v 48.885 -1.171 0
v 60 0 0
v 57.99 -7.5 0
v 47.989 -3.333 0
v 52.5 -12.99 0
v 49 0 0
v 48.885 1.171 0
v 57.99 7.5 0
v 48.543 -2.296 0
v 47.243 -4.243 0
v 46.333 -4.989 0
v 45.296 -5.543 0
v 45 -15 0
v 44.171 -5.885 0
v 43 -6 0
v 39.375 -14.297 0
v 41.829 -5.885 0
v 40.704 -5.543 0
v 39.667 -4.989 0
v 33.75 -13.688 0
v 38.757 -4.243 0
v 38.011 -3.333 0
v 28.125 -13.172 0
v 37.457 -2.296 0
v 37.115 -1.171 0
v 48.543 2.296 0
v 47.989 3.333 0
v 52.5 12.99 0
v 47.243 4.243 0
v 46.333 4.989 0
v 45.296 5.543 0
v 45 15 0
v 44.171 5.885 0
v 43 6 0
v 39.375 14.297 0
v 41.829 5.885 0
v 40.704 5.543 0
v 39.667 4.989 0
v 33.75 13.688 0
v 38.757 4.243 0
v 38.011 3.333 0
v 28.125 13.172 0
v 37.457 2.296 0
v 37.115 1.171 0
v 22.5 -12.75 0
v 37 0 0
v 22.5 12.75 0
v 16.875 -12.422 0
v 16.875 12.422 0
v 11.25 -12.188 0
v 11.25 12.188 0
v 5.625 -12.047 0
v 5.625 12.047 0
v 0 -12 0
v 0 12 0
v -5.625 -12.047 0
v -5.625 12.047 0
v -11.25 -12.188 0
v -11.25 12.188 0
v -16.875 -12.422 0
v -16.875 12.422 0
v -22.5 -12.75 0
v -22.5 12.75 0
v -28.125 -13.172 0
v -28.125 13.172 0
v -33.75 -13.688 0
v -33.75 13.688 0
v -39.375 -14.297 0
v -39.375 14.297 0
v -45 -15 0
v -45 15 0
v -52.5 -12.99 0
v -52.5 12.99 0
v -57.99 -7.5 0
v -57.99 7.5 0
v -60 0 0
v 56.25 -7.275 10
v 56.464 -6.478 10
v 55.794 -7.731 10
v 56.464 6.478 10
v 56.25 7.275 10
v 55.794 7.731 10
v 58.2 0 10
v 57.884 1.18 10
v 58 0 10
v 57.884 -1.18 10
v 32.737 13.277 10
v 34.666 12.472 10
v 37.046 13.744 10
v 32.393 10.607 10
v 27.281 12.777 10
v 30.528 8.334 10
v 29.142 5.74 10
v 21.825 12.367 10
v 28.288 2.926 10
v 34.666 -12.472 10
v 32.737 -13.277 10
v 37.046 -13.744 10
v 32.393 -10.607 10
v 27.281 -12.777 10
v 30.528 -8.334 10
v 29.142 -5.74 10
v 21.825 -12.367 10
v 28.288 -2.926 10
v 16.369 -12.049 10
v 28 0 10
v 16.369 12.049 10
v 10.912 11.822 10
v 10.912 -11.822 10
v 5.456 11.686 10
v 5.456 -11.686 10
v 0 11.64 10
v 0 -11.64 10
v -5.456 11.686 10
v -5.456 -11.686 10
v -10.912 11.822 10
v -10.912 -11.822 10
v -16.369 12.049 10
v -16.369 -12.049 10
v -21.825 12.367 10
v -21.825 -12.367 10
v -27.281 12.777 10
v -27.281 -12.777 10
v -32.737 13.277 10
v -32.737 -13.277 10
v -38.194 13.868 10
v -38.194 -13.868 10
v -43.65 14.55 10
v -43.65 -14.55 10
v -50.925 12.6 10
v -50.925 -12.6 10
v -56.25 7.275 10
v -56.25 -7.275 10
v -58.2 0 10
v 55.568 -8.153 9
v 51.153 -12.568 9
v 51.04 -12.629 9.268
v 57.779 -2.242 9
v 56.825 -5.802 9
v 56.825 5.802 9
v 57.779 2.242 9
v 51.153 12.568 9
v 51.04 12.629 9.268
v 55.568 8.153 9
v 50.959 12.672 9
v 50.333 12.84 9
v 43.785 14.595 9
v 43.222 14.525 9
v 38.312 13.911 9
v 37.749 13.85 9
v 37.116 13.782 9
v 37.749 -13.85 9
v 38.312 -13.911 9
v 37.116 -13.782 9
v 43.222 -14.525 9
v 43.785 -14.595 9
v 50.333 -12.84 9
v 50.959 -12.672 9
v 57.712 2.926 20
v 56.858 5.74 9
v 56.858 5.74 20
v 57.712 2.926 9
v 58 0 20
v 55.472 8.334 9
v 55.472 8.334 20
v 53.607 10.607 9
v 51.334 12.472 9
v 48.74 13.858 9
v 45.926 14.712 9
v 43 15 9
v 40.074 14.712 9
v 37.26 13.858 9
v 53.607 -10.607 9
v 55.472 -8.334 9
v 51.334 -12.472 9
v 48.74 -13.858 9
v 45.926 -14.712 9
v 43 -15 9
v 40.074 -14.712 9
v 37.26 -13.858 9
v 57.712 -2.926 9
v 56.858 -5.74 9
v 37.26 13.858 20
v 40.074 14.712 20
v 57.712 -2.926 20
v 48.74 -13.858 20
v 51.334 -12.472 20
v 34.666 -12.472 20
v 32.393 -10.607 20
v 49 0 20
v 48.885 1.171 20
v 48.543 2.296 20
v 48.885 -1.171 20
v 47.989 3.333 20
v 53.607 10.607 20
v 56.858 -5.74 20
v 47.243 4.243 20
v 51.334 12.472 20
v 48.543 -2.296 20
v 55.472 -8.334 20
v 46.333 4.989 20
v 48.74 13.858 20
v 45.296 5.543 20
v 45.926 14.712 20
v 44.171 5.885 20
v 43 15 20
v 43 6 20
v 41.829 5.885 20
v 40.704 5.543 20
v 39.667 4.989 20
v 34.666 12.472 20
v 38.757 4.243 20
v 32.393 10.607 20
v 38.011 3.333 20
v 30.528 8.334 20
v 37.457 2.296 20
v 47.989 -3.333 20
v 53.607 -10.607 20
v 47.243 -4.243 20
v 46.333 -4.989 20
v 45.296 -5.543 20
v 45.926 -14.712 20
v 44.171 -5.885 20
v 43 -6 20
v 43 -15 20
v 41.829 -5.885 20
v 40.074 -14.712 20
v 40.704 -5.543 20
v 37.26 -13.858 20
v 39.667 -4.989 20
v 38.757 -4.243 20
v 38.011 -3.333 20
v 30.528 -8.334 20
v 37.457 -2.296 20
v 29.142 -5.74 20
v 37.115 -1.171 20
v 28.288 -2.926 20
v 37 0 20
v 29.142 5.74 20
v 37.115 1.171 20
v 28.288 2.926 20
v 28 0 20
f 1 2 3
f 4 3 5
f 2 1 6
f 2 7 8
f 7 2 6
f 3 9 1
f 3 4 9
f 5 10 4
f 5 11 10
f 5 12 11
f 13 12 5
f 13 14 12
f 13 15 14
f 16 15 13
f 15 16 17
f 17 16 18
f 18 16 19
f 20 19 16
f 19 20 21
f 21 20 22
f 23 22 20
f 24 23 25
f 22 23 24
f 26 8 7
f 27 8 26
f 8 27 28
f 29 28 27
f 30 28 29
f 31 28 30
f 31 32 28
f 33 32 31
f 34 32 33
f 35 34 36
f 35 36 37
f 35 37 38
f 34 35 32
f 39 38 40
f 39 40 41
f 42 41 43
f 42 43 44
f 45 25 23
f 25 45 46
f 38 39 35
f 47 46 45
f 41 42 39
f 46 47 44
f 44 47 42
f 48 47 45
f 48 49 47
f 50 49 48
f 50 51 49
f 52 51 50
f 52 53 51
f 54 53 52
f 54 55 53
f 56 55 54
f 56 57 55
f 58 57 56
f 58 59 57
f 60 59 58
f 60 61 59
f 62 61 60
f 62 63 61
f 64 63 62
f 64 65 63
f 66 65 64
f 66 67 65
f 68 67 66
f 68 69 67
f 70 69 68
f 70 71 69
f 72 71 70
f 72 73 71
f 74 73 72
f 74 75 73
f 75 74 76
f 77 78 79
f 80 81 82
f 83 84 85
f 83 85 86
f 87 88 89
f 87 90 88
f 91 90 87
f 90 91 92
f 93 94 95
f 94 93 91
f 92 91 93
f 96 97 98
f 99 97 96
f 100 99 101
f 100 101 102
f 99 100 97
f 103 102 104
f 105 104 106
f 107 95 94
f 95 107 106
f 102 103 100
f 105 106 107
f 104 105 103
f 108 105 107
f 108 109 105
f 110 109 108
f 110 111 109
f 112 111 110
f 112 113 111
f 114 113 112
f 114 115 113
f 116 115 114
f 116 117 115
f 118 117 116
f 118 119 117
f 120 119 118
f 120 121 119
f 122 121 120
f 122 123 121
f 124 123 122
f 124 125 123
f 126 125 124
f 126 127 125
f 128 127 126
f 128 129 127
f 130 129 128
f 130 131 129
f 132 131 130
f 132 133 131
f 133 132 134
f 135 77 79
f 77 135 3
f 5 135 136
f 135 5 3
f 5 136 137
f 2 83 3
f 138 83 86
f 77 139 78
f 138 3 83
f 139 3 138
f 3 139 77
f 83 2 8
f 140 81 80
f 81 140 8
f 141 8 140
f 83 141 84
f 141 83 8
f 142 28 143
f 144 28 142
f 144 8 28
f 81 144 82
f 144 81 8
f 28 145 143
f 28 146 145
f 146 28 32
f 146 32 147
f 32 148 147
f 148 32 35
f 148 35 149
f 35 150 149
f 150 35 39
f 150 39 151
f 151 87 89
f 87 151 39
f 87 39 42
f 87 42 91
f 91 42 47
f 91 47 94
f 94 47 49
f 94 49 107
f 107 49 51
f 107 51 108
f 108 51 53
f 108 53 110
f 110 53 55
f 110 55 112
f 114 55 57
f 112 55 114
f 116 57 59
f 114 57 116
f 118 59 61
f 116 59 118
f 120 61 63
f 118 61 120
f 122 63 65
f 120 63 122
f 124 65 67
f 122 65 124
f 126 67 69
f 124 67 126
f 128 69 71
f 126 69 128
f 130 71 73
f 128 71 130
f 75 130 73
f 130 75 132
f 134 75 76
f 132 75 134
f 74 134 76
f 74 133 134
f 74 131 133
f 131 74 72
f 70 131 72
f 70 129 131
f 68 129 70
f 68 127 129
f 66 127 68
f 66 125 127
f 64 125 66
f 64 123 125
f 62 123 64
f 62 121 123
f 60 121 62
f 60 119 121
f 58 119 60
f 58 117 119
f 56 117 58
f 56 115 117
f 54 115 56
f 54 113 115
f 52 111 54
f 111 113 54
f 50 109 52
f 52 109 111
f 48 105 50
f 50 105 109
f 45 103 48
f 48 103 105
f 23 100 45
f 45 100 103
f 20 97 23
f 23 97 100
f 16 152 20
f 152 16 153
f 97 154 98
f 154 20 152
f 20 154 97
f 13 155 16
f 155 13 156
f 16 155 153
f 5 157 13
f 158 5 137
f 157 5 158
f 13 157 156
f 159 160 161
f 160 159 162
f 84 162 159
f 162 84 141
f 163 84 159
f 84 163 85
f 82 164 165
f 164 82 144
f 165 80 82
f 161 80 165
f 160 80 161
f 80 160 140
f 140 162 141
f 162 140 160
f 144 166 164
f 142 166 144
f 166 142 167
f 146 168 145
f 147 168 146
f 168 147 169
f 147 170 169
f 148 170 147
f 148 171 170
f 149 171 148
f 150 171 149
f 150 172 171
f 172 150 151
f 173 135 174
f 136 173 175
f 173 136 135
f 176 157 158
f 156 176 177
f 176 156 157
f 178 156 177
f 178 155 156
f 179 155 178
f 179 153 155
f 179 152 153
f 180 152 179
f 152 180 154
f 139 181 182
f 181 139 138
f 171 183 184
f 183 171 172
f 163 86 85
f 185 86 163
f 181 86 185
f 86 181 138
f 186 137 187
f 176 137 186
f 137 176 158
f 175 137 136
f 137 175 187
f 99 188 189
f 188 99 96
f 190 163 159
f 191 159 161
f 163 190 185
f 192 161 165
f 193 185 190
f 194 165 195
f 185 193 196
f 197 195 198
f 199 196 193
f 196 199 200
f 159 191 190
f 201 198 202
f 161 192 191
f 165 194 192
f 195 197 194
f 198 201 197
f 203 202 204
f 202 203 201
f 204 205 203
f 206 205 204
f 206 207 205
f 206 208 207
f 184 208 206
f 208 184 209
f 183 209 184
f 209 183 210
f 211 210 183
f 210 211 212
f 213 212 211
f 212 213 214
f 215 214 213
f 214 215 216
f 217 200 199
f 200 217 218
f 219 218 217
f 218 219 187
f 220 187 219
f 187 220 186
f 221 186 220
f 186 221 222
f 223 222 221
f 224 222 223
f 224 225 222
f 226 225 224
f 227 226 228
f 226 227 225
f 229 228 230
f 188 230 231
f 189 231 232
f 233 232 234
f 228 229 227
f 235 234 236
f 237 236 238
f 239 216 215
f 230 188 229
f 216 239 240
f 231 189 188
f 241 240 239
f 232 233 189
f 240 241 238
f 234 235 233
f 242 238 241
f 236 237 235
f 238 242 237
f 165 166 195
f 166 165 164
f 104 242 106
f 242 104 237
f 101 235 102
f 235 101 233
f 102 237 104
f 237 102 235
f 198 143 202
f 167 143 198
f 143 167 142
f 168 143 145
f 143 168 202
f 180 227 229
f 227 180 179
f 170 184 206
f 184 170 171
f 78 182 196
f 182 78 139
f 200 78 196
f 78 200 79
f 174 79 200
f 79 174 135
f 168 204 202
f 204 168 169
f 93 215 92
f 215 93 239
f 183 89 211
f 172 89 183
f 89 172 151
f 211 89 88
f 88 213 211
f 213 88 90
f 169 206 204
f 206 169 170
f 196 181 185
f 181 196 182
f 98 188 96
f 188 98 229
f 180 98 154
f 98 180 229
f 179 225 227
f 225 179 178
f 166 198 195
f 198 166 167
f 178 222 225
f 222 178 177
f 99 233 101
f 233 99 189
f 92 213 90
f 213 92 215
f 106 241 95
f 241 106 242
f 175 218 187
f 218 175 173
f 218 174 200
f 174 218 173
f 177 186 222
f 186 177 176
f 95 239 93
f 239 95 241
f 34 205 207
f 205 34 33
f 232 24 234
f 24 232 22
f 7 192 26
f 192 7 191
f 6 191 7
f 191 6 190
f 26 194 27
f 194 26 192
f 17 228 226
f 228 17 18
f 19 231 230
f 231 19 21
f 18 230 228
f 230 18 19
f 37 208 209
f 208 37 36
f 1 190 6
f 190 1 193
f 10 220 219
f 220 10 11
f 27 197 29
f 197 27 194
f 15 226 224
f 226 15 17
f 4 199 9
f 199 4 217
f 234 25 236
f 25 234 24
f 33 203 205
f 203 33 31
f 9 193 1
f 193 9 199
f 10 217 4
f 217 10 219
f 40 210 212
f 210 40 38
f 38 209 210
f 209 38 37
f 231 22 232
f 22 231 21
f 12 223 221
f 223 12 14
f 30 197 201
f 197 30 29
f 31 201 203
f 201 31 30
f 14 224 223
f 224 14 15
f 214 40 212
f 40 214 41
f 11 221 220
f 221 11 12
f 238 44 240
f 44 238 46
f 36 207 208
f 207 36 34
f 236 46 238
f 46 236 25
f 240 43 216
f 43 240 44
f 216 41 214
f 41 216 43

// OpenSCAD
$fn = 32;

// ----------------------------------------------------------------------
// Handle: 120 x 30 mm grip, 10 mm thick
// ----------------------------------------------------------------------

// --- parameters (mm) ---
length = 120;             // grip length
width = 30;               // grip width
thickness = 10;           // grip thickness
waist = 0.8;              // width factor at the middle
draft = 0.97;             // top face scale of the extrusion
boss_d = 30;              // mounting boss diameter
boss_h = 10;              // mounting boss height
boss_hole_d = 12;         // screw clearance through the boss
boss_r = 43;              // boss centre from the grip centre

/* ergonomic grip outline, closed spline-like polygon in the XY plane */
grip = [[-45, 15], [-39.375, 14.297], [-33.75, 13.688], [-28.125, 13.172], [-22.5, 12.75], [-16.875, 12.422], [-11.25, 12.188], [-5.625, 12.047], [0, 12], [5.625, 12.047], [11.25, 12.188], [16.875, 12.422], [22.5, 12.75], [28.125, 13.172], [33.75, 13.688], [39.375, 14.297], [45, 15], [52.5, 12.99], [57.99, 7.5], [60, 0], [57.99, -7.5], [52.5, -12.99], [45, -15], [45, -15], [39.375, -14.297], [33.75, -13.688], [28.125, -13.172], [22.5, -12.75], [16.875, -12.422], [11.25, -12.188], [5.625, -12.047], [0, -12], [-5.625, -12.047], [-11.25, -12.188], [-16.875, -12.422], [-22.5, -12.75], [-28.125, -13.172], [-33.75, -13.688], [-39.375, -14.297], [-45, -15], [-52.5, -12.99], [-57.99, -7.5], [-60, 0], [-57.99, 7.5], [-52.5, 12.99], [-45, 15]];

module grip_body() {
  linear_extrude(height = thickness, scale = draft) polygon(grip);
}

module boss_body() {
  /* sunk 1 mm into the grip so the joint overlaps */
  translate([boss_r, 0, thickness - 1]) cylinder(h = boss_h + 1, d = boss_d);
}

difference() {
  union() {
    grip_body();
    boss_body();
  }
  translate([boss_r, 0, -1]) cylinder(h = thickness + boss_h + 2, d = boss_hole_d);
}
